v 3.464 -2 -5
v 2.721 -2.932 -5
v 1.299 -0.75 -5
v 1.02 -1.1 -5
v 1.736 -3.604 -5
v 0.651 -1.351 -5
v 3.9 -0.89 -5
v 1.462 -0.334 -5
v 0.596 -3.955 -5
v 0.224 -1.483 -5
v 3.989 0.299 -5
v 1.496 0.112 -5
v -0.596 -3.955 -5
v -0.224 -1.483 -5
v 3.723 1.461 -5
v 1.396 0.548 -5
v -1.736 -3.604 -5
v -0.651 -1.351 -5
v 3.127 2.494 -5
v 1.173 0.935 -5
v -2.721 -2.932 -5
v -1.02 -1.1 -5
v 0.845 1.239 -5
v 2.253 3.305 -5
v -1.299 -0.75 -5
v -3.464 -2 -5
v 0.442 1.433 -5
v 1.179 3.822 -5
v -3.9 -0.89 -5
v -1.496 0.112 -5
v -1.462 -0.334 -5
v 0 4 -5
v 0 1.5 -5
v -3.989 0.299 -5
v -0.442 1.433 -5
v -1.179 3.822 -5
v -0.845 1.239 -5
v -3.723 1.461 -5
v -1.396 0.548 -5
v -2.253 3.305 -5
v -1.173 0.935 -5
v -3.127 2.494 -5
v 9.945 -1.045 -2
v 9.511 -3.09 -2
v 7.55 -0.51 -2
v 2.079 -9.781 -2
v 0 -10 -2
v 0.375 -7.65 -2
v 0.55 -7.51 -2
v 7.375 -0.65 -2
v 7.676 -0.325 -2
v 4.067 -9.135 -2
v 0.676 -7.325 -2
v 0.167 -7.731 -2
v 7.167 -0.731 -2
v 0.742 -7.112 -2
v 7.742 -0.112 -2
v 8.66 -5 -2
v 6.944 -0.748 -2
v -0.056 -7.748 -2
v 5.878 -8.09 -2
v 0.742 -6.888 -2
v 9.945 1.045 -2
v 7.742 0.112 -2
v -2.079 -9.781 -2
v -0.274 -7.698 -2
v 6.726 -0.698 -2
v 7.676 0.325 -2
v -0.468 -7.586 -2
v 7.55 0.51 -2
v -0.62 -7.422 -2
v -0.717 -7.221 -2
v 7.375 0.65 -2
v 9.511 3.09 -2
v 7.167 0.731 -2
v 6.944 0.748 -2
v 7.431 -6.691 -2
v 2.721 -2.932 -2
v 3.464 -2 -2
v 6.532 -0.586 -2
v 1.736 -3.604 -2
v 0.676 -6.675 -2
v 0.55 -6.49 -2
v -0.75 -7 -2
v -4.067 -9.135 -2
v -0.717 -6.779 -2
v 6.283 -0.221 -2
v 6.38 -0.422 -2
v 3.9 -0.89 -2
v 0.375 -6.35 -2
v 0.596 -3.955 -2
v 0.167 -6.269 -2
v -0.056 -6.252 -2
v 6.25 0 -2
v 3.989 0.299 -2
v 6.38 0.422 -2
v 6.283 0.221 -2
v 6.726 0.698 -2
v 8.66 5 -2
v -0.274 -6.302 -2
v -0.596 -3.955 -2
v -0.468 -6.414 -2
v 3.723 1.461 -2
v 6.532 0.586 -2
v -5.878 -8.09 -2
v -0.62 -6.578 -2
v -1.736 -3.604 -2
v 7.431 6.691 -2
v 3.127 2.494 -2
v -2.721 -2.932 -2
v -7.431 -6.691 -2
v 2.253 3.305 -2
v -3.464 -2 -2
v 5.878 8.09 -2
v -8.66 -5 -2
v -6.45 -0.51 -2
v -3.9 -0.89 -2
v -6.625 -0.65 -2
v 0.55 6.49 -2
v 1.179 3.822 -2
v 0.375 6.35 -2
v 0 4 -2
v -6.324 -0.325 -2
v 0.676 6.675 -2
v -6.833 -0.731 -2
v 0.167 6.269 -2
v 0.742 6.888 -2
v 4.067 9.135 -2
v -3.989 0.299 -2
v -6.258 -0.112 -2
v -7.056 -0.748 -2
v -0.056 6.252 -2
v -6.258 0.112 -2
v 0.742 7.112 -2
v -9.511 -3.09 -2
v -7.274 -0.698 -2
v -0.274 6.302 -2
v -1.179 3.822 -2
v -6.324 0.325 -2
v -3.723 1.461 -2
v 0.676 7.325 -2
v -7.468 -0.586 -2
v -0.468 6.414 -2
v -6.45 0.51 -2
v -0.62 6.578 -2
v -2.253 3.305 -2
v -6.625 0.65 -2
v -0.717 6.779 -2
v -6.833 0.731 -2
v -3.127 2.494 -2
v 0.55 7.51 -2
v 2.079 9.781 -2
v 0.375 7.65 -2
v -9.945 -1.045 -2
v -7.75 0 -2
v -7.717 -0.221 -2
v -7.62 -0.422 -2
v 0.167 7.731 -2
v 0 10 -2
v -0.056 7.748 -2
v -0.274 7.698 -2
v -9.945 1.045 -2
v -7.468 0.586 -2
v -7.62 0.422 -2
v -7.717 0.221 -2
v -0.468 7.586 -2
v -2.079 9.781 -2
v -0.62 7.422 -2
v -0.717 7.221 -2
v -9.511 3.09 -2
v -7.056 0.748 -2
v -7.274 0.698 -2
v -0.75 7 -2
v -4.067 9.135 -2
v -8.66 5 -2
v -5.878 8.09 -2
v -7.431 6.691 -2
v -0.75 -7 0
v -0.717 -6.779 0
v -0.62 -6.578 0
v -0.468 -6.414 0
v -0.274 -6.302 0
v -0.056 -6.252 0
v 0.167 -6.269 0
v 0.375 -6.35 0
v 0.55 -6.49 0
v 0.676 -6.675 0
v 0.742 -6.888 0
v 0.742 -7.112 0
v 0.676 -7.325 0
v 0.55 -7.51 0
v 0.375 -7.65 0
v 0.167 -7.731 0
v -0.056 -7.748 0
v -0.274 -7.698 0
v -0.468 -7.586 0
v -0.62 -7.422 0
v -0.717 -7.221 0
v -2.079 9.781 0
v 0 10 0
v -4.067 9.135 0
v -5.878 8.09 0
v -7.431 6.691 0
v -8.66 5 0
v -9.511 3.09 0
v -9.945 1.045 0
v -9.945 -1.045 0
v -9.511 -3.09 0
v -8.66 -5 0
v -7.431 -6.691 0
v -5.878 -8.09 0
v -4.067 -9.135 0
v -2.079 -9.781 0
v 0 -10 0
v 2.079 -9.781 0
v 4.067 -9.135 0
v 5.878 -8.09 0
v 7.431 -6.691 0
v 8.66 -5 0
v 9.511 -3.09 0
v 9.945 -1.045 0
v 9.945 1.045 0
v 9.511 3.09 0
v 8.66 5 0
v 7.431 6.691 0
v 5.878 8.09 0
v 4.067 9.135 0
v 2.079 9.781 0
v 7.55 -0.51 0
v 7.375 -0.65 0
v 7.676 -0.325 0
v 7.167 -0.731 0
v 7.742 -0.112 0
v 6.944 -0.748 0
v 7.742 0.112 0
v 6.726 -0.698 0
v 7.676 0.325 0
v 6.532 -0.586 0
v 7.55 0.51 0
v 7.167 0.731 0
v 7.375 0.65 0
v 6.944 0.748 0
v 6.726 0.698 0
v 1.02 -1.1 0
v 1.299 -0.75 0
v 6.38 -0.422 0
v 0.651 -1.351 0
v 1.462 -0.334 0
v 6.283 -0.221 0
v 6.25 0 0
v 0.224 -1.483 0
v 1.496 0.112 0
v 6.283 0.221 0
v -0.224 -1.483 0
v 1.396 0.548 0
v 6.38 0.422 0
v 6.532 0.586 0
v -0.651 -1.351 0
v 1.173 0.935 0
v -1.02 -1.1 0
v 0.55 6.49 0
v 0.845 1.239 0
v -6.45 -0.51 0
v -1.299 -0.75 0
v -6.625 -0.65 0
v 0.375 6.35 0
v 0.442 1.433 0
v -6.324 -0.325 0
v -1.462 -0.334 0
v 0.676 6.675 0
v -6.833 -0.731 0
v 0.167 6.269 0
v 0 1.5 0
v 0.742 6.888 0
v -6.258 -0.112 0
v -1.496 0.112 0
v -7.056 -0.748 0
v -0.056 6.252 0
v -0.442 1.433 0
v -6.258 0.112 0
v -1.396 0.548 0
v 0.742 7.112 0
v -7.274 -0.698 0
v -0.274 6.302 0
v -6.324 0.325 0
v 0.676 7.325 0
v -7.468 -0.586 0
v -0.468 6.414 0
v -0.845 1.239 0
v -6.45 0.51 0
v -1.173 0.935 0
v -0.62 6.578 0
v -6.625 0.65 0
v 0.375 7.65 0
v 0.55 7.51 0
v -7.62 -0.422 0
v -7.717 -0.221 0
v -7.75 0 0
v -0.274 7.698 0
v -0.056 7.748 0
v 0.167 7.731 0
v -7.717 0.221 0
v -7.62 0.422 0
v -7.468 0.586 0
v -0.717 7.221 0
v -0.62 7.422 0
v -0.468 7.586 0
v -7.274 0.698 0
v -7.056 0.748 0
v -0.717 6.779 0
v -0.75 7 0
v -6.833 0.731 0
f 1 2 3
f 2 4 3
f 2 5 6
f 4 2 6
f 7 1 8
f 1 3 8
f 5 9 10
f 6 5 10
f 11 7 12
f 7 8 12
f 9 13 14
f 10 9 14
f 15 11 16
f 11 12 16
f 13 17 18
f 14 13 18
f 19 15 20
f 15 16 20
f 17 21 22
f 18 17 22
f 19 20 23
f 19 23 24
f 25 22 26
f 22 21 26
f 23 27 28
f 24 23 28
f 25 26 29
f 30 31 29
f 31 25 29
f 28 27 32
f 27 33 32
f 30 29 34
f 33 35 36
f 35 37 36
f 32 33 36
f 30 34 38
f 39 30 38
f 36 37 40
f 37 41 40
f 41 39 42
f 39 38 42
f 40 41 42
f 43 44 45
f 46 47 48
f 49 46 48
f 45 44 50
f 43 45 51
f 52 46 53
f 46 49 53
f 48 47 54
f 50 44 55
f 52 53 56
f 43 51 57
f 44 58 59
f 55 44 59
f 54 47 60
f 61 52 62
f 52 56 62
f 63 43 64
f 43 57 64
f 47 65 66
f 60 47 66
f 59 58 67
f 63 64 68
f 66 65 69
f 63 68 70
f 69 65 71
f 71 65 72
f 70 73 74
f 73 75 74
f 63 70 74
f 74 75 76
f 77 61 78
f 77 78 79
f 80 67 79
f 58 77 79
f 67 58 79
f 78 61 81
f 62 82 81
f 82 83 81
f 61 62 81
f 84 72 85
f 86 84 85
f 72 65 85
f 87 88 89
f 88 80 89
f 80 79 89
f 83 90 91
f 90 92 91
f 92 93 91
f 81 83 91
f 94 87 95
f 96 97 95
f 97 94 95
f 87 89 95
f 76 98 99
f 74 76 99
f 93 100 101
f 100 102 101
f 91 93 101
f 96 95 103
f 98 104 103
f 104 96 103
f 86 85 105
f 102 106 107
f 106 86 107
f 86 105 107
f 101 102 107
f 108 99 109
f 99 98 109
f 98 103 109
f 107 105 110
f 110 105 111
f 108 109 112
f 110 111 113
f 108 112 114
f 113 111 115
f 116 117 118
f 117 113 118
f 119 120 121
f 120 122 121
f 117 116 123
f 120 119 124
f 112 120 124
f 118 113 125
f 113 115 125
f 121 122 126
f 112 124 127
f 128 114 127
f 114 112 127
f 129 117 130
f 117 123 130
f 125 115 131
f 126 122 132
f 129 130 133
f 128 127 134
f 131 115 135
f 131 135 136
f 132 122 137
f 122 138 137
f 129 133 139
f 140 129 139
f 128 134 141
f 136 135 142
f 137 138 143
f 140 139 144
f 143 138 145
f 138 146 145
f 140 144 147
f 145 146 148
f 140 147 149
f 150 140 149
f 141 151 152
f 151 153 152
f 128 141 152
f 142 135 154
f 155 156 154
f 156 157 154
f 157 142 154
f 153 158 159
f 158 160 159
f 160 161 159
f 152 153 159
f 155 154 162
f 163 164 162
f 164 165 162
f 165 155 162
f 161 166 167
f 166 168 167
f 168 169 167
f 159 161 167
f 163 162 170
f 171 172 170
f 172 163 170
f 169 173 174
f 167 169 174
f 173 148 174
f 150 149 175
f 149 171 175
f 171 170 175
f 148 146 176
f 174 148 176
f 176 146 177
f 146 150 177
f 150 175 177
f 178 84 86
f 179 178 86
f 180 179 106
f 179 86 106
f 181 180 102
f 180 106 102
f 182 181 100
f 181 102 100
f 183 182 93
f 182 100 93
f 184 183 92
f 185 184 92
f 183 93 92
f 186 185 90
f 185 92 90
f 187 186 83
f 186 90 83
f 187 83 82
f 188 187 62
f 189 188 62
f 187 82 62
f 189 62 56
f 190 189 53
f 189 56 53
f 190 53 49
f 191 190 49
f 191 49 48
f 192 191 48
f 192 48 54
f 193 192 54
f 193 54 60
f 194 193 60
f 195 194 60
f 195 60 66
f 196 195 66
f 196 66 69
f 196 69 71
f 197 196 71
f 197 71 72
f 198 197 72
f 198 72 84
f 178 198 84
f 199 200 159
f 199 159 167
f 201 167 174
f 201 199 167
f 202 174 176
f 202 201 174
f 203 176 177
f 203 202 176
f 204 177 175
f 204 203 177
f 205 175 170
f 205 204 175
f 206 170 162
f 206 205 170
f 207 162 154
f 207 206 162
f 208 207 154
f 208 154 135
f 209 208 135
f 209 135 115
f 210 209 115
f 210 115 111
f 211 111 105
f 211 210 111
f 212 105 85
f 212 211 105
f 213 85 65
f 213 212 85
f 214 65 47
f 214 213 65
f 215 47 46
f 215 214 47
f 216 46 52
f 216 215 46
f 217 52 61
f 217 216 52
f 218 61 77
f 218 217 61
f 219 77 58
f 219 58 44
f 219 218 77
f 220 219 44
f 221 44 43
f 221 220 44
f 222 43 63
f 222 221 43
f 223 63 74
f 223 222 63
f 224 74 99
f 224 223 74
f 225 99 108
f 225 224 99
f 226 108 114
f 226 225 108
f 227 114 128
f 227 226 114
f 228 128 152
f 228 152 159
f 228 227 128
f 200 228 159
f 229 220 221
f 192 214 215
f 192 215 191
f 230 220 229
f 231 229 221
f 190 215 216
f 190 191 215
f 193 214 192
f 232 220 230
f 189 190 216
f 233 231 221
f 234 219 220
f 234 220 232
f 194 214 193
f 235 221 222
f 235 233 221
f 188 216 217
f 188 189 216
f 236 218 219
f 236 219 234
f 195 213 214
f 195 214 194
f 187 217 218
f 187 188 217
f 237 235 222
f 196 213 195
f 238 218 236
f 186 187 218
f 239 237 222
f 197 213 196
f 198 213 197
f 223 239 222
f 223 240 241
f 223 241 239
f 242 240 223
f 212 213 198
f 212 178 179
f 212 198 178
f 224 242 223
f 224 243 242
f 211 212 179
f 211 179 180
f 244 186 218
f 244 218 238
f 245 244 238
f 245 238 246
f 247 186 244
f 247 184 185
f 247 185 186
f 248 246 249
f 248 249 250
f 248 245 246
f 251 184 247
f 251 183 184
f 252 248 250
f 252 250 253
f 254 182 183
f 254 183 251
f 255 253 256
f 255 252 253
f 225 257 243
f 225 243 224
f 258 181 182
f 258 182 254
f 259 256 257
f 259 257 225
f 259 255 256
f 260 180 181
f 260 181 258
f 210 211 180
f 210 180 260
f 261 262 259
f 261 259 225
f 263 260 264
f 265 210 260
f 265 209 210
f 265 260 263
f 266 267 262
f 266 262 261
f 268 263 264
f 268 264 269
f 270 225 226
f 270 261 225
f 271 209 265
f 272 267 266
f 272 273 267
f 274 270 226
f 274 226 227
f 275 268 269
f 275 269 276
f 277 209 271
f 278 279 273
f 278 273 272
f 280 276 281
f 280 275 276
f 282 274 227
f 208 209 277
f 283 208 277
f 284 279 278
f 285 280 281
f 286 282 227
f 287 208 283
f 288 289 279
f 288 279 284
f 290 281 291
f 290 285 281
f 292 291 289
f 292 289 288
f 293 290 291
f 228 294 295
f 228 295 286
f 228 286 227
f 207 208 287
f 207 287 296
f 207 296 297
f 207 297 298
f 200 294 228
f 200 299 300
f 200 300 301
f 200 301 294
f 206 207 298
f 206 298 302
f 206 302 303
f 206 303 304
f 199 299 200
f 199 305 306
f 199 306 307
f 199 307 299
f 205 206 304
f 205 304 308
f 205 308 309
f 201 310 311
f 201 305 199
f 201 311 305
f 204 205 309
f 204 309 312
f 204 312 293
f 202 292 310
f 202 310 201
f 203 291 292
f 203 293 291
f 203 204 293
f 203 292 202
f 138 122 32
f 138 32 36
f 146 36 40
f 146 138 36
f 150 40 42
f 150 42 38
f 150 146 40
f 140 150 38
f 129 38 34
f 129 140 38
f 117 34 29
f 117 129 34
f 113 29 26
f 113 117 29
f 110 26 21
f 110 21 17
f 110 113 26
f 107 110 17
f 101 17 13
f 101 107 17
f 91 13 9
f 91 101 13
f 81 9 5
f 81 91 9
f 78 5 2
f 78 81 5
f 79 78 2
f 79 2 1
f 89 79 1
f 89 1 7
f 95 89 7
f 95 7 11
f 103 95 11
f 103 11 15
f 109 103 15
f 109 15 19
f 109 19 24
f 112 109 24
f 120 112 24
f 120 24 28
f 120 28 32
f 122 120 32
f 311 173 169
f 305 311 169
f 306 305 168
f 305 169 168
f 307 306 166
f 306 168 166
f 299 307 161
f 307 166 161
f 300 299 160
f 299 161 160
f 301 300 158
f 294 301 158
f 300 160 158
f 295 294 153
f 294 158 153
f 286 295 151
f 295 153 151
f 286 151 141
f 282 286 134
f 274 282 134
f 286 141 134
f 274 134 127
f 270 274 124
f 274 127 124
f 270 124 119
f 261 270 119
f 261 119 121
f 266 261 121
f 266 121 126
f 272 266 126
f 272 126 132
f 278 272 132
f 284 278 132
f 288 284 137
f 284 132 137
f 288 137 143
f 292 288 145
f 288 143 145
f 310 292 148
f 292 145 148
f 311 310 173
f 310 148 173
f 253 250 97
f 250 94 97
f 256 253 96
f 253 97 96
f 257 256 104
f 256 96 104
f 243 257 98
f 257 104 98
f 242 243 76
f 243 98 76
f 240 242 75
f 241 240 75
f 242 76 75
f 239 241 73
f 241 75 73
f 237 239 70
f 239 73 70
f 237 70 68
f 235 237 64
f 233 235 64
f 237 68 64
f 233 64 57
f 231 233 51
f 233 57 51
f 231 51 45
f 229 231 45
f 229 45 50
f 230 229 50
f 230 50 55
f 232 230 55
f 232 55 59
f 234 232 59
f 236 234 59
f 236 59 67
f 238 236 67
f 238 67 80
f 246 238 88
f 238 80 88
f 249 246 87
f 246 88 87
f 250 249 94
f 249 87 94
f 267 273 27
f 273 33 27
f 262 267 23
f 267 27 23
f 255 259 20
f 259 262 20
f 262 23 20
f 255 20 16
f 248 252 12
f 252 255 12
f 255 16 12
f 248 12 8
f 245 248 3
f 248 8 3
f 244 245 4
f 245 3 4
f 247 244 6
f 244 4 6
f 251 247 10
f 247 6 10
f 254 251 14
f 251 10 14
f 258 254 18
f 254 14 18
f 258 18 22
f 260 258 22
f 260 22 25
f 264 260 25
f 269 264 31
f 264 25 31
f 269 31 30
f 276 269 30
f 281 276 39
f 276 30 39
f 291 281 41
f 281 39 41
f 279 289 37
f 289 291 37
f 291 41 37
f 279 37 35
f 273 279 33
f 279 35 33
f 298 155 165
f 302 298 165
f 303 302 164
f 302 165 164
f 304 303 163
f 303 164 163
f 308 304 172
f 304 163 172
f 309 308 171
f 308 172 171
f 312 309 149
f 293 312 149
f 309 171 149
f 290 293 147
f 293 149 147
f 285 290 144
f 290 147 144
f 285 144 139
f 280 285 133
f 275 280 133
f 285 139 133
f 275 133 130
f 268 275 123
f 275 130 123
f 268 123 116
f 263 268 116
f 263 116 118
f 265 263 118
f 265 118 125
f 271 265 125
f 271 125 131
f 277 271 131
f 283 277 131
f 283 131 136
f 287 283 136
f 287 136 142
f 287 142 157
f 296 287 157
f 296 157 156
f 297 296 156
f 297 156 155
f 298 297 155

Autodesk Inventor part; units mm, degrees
ref_plane "YZ Plane" through (0, 0, 0) normal (1, 0, 0) x (0, 1, 0)
ref_plane "XZ Plane" through (0, 0, 0) normal (0, 1, 0) x (-1, 0, 0)
ref_plane "XY Plane" through (0, 0, 0) normal (0, 0, 1) x (1, 0, 0)
sketch "Boceto1" plane through (0, 0, 0) normal (1, 0, 0) x (0, 1, 0)
  line L0 (1.5, 0) -> (1.5, -5)
  line L1 (1.5, -5) -> (4, -5)
  line L2 (4, -5) -> (4, -2)
  line L3 (4, -2) -> (10, -2)
  line L4 (10, -2) -> (10, 0)
  line L5 (10, 0) -> (1.5, 0)
  line L6 (0, 0) -> (0, -11.2963)
  line L7 (0, -13.5555) -> (0, 2.2593) projected
  dimension "d0" = 10
  dimension "d1" = 1.5
  dimension "d4" = 4
  dimension "d6" = 2
  dimension "d7" = 5
revolve "Revolución1" add sketch "Boceto1" angle 360 about axis through (0, 0, -10) along (0, 0, 1)
sketch "Boceto2" plane through (0, 0, -2) normal (0, 0, -1) x (-1, 0, 0)
  circle A0 centre (0, 7) radius 0.75
  circle A1 centre (-7, 0) radius 0.75
  circle A2 centre (0, -7) radius 0.75
  circle A3 centre (7, 0) radius 0.75
  circle A4 centre (0, 0) radius 7
  dimension "d25" = 14
  dimension "d20" = 1.5
  dimension "d23" = 360
extrude "Extrusión1" cut sketch "Boceto2" against normal through all contours A0 A4 | A4 A0 | A4 A1 | A1 A4 | A4 A3 | A3 A4 | A4 A2 | A2 A4
properties part number "Brida de servo"
